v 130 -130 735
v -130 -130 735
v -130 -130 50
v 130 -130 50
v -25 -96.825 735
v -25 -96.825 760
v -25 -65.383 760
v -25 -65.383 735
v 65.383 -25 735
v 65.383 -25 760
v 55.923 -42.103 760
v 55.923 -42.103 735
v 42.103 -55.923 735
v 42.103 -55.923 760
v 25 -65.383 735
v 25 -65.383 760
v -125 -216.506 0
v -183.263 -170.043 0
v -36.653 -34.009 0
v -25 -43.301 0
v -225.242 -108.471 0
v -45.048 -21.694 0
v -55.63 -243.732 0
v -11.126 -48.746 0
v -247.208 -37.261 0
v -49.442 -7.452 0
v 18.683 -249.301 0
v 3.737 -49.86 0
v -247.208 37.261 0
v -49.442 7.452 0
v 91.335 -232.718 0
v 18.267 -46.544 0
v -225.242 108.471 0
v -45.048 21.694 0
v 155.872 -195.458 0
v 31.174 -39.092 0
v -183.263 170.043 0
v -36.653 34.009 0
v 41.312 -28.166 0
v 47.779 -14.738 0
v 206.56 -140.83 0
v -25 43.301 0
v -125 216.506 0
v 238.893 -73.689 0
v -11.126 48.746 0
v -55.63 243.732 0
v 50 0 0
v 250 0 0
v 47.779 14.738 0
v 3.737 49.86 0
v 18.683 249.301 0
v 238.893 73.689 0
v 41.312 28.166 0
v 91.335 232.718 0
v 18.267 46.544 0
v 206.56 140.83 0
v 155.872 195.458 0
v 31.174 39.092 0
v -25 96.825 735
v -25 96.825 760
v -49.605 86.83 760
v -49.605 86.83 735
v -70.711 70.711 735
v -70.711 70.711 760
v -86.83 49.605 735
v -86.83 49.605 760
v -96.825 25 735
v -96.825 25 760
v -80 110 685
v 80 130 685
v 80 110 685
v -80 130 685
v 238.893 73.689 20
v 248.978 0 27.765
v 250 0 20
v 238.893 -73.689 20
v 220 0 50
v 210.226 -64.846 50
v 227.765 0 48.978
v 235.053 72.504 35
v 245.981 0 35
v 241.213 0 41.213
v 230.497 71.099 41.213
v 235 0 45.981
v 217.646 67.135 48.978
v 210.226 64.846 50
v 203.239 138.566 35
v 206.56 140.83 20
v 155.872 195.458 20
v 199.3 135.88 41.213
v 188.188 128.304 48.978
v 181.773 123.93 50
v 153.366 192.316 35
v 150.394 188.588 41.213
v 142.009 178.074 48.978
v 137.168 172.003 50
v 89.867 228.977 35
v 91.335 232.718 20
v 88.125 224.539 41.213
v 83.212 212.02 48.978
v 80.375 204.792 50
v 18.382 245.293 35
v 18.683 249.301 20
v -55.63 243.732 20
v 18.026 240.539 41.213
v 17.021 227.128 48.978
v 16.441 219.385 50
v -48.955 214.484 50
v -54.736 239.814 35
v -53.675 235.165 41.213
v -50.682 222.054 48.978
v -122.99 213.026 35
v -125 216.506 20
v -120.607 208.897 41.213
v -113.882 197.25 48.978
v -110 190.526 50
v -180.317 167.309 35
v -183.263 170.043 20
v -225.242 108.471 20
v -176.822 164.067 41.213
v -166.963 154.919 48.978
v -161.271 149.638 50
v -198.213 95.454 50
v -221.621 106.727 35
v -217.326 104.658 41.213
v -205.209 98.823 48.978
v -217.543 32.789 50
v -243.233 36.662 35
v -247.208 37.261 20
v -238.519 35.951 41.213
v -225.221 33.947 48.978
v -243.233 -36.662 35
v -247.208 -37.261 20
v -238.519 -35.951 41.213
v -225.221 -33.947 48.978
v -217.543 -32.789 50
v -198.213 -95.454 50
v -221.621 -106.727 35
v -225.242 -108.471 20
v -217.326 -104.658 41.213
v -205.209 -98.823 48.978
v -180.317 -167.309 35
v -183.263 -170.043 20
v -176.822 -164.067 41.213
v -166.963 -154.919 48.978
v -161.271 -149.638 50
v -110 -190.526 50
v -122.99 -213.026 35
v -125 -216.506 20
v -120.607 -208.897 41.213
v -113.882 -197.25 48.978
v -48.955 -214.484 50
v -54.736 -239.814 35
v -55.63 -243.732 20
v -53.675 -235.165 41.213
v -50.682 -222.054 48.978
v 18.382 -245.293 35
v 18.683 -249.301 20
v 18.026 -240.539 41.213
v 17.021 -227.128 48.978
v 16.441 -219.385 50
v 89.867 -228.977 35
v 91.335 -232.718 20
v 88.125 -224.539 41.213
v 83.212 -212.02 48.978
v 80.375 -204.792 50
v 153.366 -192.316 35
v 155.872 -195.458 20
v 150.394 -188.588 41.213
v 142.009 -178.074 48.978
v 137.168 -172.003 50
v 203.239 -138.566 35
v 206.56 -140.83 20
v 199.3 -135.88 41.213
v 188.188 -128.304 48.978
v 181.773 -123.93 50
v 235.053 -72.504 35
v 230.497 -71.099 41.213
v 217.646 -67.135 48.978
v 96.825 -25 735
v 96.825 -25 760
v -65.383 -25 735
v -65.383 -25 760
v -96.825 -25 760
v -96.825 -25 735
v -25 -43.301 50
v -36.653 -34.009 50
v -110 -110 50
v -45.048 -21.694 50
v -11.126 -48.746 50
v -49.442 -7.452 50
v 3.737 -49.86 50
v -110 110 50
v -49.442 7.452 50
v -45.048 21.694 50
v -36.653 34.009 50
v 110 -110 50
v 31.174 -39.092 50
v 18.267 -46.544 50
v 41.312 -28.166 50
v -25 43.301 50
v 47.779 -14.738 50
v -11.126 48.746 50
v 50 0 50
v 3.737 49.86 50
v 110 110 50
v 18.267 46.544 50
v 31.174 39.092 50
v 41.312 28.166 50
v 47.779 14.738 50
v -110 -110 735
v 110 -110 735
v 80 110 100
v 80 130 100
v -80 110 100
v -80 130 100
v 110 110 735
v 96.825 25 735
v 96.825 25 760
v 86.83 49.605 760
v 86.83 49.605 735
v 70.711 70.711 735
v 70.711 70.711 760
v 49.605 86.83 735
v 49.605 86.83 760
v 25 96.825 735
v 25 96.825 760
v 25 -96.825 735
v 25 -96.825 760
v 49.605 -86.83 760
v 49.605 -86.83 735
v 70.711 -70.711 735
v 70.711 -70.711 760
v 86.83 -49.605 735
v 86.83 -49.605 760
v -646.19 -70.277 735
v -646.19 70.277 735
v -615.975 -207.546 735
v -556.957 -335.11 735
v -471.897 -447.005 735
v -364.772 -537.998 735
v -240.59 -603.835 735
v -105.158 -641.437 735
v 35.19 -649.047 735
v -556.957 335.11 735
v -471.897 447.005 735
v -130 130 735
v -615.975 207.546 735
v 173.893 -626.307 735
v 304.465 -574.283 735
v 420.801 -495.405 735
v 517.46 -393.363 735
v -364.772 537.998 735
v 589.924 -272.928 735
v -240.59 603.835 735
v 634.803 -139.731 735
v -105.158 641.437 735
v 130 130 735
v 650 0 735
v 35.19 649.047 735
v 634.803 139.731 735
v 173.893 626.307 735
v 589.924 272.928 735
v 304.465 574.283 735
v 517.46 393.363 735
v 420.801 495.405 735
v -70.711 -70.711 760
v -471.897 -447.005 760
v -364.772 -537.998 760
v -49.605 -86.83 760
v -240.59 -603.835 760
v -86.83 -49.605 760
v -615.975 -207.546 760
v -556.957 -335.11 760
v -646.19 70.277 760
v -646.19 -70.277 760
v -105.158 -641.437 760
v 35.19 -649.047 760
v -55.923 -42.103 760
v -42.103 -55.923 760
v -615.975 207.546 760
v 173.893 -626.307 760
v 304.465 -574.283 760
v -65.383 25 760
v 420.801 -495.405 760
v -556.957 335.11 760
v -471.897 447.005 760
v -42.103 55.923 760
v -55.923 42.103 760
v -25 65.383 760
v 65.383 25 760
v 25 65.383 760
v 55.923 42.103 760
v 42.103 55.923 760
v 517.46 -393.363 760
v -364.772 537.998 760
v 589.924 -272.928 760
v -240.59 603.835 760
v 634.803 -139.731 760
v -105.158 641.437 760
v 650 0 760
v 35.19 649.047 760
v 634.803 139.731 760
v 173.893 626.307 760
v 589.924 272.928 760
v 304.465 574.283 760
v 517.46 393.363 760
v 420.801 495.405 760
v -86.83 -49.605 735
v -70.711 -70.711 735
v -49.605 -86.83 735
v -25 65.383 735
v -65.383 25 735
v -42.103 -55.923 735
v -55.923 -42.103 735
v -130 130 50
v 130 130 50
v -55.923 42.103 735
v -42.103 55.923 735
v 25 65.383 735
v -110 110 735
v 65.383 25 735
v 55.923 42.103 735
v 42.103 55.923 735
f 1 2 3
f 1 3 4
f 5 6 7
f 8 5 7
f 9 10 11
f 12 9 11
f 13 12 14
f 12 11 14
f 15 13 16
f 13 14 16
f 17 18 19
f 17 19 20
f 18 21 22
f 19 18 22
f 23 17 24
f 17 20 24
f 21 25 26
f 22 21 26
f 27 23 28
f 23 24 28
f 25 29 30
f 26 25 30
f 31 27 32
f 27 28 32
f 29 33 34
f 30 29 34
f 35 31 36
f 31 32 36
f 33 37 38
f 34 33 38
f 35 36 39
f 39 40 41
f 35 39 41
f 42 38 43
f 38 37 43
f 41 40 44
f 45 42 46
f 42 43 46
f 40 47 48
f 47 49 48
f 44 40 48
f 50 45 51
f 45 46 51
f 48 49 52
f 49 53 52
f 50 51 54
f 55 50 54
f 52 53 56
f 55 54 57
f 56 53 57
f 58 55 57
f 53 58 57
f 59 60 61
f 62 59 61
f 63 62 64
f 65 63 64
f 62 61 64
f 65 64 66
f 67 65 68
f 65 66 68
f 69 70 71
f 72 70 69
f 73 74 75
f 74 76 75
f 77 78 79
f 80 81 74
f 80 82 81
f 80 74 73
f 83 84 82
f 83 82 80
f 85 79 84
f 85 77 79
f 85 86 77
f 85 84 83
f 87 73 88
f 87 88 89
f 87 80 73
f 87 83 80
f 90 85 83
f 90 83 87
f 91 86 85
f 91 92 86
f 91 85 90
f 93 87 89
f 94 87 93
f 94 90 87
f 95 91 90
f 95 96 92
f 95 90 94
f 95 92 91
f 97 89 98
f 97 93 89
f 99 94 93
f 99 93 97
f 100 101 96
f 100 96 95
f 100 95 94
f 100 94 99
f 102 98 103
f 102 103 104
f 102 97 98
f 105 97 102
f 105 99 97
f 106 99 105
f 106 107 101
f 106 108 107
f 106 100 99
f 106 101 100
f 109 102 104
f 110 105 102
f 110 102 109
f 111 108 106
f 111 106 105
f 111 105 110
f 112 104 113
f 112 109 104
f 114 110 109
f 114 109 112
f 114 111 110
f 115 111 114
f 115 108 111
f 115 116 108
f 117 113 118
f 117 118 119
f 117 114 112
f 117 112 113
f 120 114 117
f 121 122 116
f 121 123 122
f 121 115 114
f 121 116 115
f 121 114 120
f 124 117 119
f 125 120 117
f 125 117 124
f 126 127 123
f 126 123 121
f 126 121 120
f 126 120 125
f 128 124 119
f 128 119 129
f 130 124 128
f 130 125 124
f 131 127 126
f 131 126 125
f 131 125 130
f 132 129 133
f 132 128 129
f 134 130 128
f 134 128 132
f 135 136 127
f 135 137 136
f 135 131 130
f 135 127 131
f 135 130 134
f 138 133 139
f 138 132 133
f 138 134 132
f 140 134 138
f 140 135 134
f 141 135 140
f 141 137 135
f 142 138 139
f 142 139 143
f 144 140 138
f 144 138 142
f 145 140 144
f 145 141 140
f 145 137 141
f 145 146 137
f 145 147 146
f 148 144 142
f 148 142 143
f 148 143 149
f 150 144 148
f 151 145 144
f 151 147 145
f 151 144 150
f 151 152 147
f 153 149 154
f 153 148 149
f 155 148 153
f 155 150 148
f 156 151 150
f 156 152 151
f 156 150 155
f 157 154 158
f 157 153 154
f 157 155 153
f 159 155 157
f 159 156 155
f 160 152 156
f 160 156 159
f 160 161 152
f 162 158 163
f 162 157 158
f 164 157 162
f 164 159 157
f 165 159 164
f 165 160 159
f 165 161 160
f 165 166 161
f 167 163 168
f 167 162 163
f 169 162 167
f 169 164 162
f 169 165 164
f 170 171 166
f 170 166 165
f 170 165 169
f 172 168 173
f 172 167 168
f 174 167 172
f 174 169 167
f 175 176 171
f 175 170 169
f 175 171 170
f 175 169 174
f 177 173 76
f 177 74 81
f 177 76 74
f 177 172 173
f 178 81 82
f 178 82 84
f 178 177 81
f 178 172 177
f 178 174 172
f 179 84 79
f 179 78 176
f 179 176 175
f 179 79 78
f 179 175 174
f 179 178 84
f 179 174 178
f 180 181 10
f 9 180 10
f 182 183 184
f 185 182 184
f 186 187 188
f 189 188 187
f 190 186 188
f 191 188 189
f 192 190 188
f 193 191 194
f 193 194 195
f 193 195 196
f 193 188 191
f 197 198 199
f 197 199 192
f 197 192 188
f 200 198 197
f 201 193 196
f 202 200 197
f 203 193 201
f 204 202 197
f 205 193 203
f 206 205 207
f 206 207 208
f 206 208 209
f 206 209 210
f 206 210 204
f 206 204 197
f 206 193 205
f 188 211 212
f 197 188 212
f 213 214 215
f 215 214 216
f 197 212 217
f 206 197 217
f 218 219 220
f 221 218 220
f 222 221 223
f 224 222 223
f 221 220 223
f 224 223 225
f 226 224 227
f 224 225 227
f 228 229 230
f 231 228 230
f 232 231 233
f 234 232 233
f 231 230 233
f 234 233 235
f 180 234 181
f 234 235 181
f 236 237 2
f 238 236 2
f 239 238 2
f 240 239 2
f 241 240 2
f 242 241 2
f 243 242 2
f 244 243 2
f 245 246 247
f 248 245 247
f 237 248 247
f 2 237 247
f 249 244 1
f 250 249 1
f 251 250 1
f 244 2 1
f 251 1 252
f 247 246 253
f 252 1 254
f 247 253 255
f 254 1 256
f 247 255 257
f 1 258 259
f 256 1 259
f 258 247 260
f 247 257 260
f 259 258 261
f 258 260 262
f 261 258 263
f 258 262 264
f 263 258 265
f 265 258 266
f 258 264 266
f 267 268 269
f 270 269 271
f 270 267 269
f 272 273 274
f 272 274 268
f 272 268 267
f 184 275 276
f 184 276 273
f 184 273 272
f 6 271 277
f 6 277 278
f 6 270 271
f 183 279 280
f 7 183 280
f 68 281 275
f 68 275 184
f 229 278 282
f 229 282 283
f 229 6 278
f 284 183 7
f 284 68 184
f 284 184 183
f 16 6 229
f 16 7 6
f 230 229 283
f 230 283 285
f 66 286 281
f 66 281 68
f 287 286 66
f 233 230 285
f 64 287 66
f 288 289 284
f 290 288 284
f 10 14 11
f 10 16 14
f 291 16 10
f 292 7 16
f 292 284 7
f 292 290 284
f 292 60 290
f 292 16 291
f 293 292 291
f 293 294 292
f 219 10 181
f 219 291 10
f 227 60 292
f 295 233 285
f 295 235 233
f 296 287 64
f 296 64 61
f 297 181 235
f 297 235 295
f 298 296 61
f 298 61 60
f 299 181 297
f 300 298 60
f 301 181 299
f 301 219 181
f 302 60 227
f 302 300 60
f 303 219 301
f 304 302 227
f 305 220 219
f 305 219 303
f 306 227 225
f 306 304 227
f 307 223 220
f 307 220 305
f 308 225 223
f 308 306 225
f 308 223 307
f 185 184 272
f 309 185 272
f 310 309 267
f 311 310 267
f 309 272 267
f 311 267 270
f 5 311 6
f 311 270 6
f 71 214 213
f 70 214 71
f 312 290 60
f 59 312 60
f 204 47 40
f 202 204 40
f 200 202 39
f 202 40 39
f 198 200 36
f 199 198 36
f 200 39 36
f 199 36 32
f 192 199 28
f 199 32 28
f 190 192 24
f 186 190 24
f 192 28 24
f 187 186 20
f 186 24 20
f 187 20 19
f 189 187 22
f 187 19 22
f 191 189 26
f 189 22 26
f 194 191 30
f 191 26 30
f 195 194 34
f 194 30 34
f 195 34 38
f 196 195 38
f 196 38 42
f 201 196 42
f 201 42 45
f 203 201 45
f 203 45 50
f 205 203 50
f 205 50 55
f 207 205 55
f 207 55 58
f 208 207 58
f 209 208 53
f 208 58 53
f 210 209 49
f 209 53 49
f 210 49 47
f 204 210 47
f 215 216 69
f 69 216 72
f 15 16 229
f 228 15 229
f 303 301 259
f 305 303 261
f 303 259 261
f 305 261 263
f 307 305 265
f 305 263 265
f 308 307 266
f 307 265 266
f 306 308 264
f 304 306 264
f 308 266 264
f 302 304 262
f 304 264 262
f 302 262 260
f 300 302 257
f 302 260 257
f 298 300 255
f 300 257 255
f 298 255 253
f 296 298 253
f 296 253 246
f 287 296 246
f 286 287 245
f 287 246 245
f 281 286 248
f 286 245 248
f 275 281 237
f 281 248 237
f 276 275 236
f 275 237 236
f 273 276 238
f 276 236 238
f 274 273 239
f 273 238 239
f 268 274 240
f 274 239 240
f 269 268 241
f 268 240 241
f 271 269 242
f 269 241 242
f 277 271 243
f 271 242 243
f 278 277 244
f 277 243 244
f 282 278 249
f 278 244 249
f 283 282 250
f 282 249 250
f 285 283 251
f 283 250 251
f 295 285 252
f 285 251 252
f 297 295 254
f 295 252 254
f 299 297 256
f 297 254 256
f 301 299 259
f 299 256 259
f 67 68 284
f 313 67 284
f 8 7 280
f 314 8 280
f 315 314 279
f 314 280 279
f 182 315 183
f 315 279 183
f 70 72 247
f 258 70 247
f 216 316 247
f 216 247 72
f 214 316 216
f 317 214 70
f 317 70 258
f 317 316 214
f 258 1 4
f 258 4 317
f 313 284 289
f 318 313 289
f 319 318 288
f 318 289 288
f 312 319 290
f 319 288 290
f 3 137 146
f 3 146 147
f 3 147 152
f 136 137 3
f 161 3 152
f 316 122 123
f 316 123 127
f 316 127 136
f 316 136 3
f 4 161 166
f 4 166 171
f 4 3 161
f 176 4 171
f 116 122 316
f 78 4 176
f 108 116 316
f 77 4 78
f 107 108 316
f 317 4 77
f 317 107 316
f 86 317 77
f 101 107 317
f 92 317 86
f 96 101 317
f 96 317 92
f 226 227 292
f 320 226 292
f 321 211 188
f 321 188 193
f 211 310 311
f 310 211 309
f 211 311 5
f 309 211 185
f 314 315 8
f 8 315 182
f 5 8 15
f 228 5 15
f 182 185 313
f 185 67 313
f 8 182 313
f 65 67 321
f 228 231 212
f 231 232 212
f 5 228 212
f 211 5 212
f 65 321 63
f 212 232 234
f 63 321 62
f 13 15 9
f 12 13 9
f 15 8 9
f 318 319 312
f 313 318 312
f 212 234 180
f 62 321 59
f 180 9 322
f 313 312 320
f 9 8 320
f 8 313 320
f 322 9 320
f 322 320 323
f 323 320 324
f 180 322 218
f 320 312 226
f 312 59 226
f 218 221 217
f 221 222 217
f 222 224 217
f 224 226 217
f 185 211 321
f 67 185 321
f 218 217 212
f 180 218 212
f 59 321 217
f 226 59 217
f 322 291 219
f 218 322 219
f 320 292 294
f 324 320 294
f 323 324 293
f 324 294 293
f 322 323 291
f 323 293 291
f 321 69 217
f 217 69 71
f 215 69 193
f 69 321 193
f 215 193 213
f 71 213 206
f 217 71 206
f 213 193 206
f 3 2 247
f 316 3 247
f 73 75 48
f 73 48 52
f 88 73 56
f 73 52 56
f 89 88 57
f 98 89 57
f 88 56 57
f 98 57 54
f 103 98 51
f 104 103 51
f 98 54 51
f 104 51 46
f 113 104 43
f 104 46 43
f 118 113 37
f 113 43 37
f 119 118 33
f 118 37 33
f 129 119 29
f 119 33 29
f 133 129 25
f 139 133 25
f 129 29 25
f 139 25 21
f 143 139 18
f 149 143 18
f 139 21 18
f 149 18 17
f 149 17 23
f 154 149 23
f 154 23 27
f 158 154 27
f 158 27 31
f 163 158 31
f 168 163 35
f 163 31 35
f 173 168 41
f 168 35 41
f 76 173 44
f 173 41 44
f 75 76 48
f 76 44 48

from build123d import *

# Parameters (mm, degrees)
F0_R      = 250
F1_DEPTH  = 50
F2_R      = 30
F3_W      = 260
F3_H      = 260
F3_W_2    = 220
F3_H_2    = 220
F4_DEPTH  = 685
F5_R      = 650
F5_W      = 260
F5_H      = 260
F5_W_2    = 220
F5_H_2    = 220
F6_DEPTH  = 25
F8_DEPTH  = 100
F9_W      = 160
F9_H      = 585
F10_DEPTH = 40
F11_R     = 50
F12_DEPTH = 50


with BuildPart() as f1:
    # F0 (on Top) → F1 (new body)
    with BuildSketch(Plane.XY):
        Circle(F0_R)
    extrude(amount=F1_DEPTH)

    # F2
    f2_edges = [f1.edges().sort_by_distance(p)[0] for p in [
        (-250, 0, 50),
    ]]
    fillet(f2_edges, radius=F2_R)

    # F3 (on face) → F4 (join)
    with BuildSketch(Plane.XY.offset(50)):
        Rectangle(F3_W, F3_H)
        Rectangle(F3_W_2, F3_H_2, mode=Mode.SUBTRACT)
    extrude(amount=F4_DEPTH)

    # F5 (on face) → F6 (join)
    with BuildSketch(Plane.XY.offset(735)):
        Circle(F5_R)
        Rectangle(F5_W, F5_H, mode=Mode.SUBTRACT)
        Rectangle(F5_W, F5_H)
        Rectangle(F5_W_2, F5_H_2, mode=Mode.SUBTRACT)
        Rectangle(F5_W_2, F5_H_2)
    extrude(amount=F6_DEPTH)

    # F7 (on face) → F8 (cut)
    with BuildSketch(Plane.XY.offset(760)):
        with BuildLine():
            Line((65.3834841531, 25), (96.8245836552, 25))
            ThreePointArc((96.8245836552, 25), (70.7106781187, 70.7106781187), (25, 96.8245836552))
            Line((25, 96.8245836552), (25, 65.3834841531))
            ThreePointArc((25, 65.3834841531), (49.4974746831, 49.4974746831), (65.3834841531, 25))
        make_face()
        with BuildLine():
            Line((-25, 65.3834841531), (-25, 96.8245836552))
            ThreePointArc((-25, 96.8245836552), (-70.7106781187, 70.7106781187), (-96.8245836552, 25))
            Line((-96.8245836552, 25), (-65.3834841531, 25))
            ThreePointArc((-65.3834841531, 25), (-49.4974746831, 49.4974746831), (-25, 65.3834841531))
        make_face()
        with BuildLine():
            ThreePointArc((-96.8245836552, -25), (-70.7106781187, -70.7106781187), (-25, -96.8245836552))
            Line((-25, -96.8245836552), (-25, -65.3834841531))
            ThreePointArc((-25, -65.3834841531), (-49.4974746831, -49.4974746831), (-65.3834841531, -25))
            Line((-65.3834841531, -25), (-96.8245836552, -25))
        make_face()
        with BuildLine():
            ThreePointArc((25, -96.8245836552), (70.7106781187, -70.7106781187), (96.8245836552, -25))
            Line((96.8245836552, -25), (65.3834841531, -25))
            ThreePointArc((65.3834841531, -25), (49.4974746831, -49.4974746831), (25, -65.3834841531))
            Line((25, -65.3834841531), (25, -96.8245836552))
        make_face()
    extrude(amount=-F8_DEPTH, mode=Mode.SUBTRACT)

    # F9 (on face) → F10 (cut)
    with BuildSketch(Plane(origin=(0, 130, 0), x_dir=(-1, 0, 0), z_dir=(0, 1, 0))):
        with Locations((0, 392.5)):
            Rectangle(F9_W, F9_H)
    extrude(amount=-F10_DEPTH, mode=Mode.SUBTRACT)

    # F11 (on face) → F12 (cut)
    with BuildSketch(Plane(origin=(0, 0, 0), x_dir=(1, 0, 0), z_dir=(0, 0, -1))):
        Circle(F11_R)
    extrude(amount=-F12_DEPTH, mode=Mode.SUBTRACT)


solid = f1.part
